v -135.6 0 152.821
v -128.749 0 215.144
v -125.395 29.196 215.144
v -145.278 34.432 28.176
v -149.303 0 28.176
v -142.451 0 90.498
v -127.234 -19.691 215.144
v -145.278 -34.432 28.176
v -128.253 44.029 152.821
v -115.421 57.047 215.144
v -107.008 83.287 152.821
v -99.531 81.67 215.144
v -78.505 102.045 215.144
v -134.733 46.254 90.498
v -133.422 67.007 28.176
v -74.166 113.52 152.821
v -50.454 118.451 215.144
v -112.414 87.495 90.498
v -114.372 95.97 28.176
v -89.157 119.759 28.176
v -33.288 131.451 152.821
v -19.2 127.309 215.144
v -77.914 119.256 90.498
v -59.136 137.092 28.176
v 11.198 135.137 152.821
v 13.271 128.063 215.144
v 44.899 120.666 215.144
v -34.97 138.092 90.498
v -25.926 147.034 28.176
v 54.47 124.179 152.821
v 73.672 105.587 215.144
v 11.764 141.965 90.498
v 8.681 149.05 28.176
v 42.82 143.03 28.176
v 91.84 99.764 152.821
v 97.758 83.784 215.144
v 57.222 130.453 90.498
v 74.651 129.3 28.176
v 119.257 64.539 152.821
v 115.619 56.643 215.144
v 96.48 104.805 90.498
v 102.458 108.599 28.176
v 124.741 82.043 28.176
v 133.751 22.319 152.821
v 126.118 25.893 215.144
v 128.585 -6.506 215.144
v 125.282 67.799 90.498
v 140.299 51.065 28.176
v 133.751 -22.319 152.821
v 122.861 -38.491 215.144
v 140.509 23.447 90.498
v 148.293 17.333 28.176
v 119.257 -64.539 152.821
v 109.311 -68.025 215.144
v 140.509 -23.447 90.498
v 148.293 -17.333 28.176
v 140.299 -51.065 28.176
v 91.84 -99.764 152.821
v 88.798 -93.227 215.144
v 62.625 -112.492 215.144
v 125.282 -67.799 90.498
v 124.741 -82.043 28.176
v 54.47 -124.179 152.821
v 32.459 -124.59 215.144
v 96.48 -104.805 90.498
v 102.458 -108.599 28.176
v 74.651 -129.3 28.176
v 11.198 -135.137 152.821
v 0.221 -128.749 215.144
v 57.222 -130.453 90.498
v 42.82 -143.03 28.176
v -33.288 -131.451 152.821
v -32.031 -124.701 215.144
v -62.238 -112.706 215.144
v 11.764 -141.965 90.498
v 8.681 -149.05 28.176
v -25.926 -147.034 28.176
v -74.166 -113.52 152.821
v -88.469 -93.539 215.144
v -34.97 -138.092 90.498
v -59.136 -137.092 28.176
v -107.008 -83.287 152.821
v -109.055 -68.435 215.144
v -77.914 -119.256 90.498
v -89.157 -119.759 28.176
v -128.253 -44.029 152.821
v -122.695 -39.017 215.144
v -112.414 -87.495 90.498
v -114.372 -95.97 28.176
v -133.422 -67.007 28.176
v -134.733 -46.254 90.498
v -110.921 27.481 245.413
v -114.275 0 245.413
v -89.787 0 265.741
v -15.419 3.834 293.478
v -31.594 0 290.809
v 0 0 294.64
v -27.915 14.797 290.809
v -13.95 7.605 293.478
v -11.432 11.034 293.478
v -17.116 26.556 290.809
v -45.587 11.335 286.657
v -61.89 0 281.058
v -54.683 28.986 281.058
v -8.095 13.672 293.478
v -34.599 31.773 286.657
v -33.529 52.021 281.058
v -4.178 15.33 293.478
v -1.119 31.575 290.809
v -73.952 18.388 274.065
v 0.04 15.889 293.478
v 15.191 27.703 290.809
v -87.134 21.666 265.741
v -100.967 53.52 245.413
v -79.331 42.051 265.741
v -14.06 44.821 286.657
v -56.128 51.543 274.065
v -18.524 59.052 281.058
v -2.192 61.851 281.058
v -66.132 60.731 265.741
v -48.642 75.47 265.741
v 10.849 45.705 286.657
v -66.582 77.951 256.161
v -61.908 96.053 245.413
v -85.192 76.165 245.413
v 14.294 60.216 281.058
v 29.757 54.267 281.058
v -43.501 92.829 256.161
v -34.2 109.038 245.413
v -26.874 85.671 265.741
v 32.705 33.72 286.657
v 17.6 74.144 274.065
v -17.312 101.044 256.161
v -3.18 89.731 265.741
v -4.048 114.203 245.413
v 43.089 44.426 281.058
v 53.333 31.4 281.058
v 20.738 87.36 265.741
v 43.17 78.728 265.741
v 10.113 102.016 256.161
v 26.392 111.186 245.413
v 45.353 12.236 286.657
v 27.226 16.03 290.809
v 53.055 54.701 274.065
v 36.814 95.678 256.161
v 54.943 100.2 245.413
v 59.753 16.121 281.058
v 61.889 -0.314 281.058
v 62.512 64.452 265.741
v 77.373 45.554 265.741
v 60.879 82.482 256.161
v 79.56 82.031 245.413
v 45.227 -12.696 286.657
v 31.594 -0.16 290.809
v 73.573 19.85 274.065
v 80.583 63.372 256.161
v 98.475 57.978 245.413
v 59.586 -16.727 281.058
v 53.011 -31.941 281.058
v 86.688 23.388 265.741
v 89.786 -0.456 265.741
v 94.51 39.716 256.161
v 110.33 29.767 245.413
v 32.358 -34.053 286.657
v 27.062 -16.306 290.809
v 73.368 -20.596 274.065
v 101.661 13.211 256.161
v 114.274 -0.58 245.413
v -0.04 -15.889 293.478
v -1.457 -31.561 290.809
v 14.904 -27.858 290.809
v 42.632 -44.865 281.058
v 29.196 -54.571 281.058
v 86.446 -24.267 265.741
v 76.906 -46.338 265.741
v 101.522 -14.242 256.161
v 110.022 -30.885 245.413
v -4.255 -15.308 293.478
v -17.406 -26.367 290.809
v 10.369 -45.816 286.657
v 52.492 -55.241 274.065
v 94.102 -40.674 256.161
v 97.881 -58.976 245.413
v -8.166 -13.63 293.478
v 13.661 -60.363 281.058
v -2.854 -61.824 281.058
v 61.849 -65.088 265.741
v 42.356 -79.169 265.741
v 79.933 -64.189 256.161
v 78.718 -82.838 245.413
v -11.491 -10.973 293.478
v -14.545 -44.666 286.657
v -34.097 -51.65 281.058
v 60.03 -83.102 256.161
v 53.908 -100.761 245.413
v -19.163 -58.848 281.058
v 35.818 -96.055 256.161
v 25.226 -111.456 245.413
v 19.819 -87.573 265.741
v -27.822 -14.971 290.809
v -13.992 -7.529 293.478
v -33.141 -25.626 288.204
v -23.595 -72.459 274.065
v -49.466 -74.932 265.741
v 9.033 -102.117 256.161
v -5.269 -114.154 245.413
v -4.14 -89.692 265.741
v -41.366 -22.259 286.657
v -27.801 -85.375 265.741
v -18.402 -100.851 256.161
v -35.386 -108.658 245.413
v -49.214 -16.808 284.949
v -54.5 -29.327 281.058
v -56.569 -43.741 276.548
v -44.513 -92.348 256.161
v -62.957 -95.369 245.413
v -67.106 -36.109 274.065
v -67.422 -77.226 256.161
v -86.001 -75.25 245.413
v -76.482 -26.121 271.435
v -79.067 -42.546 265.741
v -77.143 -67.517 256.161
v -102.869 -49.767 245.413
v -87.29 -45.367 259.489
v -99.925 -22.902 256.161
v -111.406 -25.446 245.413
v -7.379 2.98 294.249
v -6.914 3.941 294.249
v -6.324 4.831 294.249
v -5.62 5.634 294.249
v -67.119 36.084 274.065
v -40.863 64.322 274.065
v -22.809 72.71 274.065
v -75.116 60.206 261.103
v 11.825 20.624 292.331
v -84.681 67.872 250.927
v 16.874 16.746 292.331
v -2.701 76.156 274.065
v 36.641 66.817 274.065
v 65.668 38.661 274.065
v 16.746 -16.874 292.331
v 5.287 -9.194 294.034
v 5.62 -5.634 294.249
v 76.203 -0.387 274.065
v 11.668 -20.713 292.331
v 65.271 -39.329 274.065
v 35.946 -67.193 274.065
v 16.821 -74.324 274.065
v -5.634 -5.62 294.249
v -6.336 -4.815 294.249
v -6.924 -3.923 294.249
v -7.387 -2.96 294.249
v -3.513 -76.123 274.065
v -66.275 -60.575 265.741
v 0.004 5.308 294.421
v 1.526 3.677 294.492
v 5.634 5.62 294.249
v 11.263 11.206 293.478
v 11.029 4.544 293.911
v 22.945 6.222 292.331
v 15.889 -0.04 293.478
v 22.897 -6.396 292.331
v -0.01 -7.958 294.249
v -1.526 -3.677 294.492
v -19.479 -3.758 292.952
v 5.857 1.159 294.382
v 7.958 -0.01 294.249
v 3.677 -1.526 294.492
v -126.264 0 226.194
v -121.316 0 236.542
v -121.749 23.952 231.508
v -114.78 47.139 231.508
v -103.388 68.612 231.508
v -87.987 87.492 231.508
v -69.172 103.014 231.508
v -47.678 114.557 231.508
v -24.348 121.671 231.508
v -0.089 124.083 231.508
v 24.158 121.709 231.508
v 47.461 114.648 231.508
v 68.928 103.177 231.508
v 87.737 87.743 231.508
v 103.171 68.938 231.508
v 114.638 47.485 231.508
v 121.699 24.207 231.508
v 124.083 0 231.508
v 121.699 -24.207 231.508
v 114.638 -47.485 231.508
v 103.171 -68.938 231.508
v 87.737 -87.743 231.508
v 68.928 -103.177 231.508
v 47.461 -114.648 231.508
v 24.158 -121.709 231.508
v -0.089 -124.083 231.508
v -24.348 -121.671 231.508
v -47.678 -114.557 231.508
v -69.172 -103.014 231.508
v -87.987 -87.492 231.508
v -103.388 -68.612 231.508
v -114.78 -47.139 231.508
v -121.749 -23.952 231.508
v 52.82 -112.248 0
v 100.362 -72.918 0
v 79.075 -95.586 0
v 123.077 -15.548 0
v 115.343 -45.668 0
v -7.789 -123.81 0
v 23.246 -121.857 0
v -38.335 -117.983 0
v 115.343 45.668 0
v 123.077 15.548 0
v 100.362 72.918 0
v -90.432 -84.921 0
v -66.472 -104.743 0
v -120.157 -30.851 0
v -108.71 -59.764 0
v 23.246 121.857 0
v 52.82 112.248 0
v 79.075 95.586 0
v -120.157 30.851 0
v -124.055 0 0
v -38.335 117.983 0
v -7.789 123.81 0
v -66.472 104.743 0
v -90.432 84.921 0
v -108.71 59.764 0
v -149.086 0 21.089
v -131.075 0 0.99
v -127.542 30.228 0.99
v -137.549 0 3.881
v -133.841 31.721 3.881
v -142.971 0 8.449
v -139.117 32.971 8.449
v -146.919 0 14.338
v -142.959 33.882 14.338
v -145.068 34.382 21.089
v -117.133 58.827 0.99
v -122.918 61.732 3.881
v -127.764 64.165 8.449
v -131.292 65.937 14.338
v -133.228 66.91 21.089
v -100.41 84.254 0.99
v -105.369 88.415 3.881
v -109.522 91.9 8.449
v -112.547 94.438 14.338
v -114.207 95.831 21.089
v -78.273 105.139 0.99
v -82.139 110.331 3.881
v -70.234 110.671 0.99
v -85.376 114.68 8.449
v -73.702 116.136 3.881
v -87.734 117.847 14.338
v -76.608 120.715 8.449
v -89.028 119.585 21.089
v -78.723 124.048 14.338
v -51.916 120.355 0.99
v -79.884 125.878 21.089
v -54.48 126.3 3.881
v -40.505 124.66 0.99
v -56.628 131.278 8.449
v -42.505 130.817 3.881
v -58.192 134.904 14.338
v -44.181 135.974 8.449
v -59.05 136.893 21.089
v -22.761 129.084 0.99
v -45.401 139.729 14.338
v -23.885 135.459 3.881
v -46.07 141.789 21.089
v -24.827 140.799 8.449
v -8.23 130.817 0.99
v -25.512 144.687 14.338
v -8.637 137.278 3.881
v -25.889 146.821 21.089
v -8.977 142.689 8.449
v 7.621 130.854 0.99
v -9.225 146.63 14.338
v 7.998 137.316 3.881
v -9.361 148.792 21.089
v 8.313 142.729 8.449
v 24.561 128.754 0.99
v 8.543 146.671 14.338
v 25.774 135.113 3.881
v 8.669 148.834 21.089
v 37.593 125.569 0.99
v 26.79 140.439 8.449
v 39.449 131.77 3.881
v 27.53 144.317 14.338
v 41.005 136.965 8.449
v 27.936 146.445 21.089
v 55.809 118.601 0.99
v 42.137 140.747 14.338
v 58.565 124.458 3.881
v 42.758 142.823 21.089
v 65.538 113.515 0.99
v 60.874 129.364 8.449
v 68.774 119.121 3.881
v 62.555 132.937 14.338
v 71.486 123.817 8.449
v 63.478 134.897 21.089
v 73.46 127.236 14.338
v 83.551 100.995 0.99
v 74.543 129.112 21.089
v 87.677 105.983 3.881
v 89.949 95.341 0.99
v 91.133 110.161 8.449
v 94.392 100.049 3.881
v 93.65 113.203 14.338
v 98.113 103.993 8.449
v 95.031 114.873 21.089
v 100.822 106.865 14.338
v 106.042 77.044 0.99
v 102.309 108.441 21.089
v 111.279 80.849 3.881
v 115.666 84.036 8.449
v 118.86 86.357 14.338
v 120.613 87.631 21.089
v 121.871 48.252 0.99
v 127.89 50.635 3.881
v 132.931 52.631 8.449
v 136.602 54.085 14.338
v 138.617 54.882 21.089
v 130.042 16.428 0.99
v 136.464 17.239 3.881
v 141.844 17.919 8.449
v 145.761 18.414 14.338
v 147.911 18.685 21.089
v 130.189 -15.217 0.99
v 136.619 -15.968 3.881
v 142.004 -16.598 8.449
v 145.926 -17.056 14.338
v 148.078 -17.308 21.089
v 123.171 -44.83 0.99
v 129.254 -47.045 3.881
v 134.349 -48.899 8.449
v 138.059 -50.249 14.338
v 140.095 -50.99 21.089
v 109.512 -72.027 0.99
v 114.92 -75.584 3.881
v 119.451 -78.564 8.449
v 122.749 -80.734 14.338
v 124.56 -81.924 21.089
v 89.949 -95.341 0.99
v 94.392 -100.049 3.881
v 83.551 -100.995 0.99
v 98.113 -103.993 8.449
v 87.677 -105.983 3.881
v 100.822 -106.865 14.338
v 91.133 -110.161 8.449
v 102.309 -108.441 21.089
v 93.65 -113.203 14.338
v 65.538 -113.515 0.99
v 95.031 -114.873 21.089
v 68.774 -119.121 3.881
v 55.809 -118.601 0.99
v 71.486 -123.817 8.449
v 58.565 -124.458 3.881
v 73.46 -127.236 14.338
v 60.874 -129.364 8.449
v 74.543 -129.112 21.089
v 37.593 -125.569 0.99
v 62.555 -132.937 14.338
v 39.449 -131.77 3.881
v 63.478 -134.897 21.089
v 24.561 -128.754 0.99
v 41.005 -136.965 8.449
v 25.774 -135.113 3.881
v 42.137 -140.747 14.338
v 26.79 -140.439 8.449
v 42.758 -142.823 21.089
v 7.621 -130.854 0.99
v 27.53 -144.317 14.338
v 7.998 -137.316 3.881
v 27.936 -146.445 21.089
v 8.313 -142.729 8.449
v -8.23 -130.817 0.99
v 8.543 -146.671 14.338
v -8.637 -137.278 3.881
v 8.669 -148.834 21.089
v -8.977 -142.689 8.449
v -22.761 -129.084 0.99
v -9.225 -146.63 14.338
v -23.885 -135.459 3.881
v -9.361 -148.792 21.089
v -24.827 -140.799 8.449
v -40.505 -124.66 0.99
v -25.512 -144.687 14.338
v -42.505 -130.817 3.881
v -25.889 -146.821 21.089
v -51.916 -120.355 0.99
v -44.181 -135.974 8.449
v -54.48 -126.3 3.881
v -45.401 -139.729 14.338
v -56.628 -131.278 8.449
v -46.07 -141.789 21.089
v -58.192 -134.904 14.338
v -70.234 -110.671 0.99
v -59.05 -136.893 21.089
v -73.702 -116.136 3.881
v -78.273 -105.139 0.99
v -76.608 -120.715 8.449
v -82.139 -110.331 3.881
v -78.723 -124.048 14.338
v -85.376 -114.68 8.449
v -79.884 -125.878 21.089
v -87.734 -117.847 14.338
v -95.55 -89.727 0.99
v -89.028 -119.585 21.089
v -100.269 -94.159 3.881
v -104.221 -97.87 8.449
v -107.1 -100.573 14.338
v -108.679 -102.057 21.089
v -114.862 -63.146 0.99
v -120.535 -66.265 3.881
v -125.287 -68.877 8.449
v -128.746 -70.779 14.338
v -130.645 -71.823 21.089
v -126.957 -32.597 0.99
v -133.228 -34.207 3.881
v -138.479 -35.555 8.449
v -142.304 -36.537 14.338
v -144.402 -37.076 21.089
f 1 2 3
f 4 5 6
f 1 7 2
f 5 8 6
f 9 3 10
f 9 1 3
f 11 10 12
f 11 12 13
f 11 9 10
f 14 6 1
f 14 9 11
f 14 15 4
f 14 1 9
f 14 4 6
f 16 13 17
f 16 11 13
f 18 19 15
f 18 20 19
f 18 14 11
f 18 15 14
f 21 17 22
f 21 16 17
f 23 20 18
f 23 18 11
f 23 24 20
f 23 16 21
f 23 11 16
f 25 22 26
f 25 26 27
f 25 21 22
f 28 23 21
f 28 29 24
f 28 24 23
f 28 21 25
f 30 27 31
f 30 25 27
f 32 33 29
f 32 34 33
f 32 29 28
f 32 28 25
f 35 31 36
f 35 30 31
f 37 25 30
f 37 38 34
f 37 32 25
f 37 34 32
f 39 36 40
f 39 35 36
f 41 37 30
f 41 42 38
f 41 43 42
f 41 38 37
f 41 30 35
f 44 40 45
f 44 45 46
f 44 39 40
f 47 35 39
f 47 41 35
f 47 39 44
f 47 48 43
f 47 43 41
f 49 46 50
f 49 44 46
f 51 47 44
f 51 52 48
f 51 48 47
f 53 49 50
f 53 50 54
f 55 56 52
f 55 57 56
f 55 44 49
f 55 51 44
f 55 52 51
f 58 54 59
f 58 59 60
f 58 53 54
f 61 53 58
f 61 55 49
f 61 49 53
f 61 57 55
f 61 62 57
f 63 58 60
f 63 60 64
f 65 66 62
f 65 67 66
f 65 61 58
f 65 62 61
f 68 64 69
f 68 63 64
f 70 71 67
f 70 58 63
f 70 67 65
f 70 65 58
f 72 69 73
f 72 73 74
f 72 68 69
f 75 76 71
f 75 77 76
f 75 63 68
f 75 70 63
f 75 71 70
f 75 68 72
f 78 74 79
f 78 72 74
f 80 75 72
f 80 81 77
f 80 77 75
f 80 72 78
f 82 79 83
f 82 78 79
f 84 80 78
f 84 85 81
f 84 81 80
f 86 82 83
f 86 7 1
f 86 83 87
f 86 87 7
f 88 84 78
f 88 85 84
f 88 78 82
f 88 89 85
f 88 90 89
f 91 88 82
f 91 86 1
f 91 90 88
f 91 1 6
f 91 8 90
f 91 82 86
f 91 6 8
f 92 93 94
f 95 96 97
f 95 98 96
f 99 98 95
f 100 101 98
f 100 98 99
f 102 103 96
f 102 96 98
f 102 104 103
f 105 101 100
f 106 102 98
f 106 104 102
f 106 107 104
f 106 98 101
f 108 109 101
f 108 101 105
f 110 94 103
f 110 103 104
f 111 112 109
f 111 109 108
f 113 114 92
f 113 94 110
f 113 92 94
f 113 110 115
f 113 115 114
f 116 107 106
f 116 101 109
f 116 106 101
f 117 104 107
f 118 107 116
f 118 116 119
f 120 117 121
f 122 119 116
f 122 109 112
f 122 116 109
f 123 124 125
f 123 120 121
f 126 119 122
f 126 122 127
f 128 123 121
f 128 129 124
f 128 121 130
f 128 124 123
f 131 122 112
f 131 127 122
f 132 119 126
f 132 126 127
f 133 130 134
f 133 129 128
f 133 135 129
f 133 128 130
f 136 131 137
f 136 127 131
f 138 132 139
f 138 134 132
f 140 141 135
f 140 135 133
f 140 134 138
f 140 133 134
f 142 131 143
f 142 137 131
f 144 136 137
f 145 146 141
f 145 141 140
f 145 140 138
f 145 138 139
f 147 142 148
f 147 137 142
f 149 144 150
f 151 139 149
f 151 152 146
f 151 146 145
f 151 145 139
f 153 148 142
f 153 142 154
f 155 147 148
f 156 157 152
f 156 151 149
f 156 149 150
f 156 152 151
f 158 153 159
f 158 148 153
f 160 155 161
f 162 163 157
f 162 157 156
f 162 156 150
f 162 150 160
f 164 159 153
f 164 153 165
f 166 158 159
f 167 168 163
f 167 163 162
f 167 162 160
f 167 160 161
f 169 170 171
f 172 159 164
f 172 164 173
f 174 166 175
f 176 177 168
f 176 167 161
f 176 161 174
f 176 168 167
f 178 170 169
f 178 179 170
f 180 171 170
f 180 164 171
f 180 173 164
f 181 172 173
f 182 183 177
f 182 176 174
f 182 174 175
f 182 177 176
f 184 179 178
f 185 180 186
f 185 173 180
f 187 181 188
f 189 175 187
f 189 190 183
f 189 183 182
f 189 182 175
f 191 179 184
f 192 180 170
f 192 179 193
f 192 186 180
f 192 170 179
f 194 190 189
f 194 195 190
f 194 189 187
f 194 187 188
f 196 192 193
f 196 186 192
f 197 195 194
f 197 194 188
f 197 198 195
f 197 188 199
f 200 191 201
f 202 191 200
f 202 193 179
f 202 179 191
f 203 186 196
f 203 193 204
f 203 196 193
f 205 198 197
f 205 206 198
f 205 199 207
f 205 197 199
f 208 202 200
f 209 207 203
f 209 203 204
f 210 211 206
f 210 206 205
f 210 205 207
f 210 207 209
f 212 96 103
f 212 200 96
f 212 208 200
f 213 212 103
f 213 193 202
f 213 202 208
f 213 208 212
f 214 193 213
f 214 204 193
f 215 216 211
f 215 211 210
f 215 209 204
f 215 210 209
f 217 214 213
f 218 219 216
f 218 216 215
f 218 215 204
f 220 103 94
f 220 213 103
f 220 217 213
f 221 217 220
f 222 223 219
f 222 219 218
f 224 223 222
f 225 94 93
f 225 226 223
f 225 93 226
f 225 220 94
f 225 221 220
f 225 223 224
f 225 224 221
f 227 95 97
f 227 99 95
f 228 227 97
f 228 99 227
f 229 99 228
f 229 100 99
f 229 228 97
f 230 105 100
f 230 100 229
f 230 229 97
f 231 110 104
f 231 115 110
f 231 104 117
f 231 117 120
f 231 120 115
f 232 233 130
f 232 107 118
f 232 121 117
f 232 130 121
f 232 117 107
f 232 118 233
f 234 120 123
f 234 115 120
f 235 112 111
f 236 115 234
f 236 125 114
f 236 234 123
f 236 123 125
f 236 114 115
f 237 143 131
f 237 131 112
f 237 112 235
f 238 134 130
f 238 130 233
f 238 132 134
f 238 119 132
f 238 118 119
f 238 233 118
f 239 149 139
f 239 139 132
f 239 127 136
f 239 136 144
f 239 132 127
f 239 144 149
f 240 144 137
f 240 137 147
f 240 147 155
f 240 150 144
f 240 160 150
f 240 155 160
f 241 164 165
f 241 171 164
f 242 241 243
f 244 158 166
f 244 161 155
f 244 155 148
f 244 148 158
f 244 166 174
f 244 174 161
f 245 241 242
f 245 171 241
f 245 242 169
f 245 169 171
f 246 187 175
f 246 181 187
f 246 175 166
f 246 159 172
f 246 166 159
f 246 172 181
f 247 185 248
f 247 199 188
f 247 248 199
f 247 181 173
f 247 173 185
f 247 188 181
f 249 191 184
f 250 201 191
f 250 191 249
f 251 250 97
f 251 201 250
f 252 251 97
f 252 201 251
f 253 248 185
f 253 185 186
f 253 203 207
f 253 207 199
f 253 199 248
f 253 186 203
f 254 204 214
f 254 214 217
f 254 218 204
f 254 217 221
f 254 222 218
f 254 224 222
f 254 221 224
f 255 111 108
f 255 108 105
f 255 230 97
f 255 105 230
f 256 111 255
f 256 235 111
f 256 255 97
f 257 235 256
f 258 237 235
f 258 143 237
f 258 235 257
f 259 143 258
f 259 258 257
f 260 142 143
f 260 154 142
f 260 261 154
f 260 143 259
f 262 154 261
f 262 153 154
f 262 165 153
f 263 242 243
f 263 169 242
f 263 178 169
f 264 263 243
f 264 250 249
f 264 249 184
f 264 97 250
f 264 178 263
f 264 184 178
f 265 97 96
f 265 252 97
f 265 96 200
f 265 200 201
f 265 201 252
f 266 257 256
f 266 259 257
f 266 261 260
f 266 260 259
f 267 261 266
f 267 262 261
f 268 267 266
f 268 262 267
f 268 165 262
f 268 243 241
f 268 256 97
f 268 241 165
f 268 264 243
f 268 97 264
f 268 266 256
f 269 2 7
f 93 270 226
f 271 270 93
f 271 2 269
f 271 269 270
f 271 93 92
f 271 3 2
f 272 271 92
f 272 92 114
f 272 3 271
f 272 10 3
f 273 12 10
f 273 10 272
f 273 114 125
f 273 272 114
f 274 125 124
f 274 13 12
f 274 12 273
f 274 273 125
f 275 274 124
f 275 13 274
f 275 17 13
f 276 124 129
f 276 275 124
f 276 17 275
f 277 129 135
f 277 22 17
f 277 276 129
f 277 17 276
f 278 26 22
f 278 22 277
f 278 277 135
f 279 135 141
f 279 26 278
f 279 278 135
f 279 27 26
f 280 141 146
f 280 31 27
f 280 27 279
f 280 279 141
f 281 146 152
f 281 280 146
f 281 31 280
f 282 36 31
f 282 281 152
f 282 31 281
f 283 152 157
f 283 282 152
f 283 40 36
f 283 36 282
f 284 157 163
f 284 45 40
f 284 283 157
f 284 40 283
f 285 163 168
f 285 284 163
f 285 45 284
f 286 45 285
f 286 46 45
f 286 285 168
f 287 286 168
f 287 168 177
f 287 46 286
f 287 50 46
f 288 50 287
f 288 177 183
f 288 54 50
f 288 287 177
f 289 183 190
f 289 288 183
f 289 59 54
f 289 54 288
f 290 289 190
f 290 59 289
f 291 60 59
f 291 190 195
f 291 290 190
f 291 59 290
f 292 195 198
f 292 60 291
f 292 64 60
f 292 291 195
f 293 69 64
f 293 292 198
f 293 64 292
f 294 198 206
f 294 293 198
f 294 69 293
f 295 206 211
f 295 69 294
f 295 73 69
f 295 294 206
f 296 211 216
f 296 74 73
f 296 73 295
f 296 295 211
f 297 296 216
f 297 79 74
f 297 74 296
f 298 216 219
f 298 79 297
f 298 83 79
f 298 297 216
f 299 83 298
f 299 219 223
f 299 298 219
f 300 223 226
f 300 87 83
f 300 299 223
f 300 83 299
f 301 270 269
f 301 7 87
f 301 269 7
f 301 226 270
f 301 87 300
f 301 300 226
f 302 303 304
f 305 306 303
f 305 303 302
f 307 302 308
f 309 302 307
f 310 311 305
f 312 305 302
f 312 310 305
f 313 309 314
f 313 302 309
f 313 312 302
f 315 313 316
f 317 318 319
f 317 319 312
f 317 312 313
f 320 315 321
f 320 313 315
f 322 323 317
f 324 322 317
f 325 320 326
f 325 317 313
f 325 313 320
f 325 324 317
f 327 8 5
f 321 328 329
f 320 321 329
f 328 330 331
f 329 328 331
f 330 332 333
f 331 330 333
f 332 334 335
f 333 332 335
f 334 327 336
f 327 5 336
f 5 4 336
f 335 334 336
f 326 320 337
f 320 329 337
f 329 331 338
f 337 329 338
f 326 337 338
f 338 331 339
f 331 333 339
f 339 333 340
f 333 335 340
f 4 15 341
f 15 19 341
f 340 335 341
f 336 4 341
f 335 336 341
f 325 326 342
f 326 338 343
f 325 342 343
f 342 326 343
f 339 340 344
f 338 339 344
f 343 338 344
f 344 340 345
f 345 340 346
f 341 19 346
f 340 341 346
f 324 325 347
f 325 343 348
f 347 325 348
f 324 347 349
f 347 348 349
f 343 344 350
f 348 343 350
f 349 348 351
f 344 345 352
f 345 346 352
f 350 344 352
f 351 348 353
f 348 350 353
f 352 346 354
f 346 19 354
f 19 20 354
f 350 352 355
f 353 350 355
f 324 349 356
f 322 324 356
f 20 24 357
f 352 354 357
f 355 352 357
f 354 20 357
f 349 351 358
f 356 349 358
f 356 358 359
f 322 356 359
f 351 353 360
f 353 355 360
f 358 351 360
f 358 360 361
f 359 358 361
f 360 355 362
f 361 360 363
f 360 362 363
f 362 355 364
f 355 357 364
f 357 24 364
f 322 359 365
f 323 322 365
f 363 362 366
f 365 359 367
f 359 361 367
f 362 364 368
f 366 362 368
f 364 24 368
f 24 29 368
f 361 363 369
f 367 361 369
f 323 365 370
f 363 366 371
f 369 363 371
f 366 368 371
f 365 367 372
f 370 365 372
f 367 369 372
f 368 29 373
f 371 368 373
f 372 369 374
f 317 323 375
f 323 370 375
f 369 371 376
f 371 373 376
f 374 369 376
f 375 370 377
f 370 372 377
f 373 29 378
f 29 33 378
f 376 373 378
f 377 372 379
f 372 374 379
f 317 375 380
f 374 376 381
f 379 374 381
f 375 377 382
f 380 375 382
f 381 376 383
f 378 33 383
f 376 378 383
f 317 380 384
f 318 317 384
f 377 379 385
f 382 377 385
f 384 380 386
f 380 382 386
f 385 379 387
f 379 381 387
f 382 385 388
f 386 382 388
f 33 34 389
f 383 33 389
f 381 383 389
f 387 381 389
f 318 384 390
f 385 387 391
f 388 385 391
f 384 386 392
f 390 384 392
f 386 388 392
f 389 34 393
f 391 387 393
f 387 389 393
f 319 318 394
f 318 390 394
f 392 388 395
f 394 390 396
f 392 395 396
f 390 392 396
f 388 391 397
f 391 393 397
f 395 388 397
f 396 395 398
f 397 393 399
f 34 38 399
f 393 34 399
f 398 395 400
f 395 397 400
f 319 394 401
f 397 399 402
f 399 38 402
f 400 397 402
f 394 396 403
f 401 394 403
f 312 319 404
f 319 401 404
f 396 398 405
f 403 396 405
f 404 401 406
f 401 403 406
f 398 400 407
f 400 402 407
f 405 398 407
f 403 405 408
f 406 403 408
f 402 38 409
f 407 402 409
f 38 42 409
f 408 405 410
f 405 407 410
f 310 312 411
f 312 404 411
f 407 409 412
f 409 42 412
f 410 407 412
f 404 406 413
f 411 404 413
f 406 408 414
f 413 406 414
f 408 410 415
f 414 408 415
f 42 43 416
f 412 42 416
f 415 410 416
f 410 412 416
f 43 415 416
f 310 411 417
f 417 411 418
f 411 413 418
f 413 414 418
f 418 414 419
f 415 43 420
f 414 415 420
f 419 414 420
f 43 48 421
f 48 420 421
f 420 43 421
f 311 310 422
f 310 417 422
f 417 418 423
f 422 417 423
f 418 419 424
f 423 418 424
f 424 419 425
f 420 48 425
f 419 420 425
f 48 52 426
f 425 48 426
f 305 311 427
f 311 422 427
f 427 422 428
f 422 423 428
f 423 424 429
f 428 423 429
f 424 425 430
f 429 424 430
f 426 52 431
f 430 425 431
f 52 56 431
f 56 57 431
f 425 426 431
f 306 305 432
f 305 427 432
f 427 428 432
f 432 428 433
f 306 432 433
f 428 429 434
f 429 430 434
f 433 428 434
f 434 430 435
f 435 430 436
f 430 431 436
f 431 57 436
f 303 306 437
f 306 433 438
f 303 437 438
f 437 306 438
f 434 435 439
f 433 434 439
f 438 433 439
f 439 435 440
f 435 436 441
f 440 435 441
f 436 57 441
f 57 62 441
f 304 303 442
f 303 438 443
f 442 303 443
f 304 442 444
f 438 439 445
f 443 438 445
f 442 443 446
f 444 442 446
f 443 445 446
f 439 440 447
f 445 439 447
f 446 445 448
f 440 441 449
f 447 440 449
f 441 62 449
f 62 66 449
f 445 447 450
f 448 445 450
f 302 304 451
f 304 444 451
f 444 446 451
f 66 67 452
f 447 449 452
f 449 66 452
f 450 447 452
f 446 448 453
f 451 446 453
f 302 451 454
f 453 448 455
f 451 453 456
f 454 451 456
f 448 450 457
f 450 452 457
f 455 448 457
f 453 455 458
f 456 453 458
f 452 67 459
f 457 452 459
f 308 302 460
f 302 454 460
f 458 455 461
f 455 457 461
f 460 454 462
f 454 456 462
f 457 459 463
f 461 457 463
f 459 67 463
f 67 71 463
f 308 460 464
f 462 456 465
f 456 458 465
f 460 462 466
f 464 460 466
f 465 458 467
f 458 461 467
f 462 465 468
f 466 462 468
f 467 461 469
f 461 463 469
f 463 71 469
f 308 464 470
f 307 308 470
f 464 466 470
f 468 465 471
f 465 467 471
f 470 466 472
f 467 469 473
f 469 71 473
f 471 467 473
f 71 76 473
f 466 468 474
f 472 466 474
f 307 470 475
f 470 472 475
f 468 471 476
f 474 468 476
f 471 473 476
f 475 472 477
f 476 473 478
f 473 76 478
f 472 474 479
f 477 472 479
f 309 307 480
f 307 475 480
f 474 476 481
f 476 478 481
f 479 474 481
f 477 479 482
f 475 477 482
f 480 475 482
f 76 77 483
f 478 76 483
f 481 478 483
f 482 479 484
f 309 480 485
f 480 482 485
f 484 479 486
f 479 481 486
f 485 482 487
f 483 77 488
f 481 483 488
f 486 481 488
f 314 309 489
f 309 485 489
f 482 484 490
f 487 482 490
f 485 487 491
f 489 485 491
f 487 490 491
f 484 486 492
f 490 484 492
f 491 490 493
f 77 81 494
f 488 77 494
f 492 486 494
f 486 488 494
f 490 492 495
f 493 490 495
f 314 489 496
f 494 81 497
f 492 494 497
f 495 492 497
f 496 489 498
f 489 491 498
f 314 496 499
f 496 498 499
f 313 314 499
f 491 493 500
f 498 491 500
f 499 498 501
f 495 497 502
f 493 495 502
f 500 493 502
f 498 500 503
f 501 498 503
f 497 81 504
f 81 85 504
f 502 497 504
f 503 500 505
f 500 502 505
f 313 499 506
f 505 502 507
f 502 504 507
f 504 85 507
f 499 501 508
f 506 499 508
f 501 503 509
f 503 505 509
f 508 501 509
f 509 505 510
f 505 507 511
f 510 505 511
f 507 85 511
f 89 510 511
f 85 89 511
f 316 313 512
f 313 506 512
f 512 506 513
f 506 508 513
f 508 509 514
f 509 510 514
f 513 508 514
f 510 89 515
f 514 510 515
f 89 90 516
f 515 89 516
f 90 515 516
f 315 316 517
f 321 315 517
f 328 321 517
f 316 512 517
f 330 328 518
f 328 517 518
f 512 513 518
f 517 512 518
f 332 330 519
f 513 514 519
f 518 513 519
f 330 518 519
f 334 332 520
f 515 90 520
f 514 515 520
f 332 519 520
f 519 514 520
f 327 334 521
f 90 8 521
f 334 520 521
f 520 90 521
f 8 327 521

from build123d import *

# Parameters (mm, degrees)
F2_R = 25.4
F3_R = 50.8


with BuildPart() as f1:
    # F0 (on Front) → F1 (revolve)
    with BuildSketch(Plane.XZ):
        with BuildLine():
            Line((-152.4, 0), (0, 0))
            Line((0, 0), (0, 294.64))
            ThreePointArc((0, 294.64), (-70.59093, 277.01008), (-127, 231.054554))
            Line((-127, 231.054554), (-152.4, 0))
        make_face()
    revolve(axis=Axis((0, 0, 147.32), (0, 0, -1)))

    # F2
    f2_edges = [f1.edges().sort_by_distance(p)[0] for p in [
        (152.4, 0, 0),
    ]]
    fillet(f2_edges, radius=F2_R)

    # F3
    f3_edges = [f1.edges().sort_by_distance(p)[0] for p in [
        (127, 0, 231.054554),
    ]]
    fillet(f3_edges, radius=F3_R)


solid = f1.part
